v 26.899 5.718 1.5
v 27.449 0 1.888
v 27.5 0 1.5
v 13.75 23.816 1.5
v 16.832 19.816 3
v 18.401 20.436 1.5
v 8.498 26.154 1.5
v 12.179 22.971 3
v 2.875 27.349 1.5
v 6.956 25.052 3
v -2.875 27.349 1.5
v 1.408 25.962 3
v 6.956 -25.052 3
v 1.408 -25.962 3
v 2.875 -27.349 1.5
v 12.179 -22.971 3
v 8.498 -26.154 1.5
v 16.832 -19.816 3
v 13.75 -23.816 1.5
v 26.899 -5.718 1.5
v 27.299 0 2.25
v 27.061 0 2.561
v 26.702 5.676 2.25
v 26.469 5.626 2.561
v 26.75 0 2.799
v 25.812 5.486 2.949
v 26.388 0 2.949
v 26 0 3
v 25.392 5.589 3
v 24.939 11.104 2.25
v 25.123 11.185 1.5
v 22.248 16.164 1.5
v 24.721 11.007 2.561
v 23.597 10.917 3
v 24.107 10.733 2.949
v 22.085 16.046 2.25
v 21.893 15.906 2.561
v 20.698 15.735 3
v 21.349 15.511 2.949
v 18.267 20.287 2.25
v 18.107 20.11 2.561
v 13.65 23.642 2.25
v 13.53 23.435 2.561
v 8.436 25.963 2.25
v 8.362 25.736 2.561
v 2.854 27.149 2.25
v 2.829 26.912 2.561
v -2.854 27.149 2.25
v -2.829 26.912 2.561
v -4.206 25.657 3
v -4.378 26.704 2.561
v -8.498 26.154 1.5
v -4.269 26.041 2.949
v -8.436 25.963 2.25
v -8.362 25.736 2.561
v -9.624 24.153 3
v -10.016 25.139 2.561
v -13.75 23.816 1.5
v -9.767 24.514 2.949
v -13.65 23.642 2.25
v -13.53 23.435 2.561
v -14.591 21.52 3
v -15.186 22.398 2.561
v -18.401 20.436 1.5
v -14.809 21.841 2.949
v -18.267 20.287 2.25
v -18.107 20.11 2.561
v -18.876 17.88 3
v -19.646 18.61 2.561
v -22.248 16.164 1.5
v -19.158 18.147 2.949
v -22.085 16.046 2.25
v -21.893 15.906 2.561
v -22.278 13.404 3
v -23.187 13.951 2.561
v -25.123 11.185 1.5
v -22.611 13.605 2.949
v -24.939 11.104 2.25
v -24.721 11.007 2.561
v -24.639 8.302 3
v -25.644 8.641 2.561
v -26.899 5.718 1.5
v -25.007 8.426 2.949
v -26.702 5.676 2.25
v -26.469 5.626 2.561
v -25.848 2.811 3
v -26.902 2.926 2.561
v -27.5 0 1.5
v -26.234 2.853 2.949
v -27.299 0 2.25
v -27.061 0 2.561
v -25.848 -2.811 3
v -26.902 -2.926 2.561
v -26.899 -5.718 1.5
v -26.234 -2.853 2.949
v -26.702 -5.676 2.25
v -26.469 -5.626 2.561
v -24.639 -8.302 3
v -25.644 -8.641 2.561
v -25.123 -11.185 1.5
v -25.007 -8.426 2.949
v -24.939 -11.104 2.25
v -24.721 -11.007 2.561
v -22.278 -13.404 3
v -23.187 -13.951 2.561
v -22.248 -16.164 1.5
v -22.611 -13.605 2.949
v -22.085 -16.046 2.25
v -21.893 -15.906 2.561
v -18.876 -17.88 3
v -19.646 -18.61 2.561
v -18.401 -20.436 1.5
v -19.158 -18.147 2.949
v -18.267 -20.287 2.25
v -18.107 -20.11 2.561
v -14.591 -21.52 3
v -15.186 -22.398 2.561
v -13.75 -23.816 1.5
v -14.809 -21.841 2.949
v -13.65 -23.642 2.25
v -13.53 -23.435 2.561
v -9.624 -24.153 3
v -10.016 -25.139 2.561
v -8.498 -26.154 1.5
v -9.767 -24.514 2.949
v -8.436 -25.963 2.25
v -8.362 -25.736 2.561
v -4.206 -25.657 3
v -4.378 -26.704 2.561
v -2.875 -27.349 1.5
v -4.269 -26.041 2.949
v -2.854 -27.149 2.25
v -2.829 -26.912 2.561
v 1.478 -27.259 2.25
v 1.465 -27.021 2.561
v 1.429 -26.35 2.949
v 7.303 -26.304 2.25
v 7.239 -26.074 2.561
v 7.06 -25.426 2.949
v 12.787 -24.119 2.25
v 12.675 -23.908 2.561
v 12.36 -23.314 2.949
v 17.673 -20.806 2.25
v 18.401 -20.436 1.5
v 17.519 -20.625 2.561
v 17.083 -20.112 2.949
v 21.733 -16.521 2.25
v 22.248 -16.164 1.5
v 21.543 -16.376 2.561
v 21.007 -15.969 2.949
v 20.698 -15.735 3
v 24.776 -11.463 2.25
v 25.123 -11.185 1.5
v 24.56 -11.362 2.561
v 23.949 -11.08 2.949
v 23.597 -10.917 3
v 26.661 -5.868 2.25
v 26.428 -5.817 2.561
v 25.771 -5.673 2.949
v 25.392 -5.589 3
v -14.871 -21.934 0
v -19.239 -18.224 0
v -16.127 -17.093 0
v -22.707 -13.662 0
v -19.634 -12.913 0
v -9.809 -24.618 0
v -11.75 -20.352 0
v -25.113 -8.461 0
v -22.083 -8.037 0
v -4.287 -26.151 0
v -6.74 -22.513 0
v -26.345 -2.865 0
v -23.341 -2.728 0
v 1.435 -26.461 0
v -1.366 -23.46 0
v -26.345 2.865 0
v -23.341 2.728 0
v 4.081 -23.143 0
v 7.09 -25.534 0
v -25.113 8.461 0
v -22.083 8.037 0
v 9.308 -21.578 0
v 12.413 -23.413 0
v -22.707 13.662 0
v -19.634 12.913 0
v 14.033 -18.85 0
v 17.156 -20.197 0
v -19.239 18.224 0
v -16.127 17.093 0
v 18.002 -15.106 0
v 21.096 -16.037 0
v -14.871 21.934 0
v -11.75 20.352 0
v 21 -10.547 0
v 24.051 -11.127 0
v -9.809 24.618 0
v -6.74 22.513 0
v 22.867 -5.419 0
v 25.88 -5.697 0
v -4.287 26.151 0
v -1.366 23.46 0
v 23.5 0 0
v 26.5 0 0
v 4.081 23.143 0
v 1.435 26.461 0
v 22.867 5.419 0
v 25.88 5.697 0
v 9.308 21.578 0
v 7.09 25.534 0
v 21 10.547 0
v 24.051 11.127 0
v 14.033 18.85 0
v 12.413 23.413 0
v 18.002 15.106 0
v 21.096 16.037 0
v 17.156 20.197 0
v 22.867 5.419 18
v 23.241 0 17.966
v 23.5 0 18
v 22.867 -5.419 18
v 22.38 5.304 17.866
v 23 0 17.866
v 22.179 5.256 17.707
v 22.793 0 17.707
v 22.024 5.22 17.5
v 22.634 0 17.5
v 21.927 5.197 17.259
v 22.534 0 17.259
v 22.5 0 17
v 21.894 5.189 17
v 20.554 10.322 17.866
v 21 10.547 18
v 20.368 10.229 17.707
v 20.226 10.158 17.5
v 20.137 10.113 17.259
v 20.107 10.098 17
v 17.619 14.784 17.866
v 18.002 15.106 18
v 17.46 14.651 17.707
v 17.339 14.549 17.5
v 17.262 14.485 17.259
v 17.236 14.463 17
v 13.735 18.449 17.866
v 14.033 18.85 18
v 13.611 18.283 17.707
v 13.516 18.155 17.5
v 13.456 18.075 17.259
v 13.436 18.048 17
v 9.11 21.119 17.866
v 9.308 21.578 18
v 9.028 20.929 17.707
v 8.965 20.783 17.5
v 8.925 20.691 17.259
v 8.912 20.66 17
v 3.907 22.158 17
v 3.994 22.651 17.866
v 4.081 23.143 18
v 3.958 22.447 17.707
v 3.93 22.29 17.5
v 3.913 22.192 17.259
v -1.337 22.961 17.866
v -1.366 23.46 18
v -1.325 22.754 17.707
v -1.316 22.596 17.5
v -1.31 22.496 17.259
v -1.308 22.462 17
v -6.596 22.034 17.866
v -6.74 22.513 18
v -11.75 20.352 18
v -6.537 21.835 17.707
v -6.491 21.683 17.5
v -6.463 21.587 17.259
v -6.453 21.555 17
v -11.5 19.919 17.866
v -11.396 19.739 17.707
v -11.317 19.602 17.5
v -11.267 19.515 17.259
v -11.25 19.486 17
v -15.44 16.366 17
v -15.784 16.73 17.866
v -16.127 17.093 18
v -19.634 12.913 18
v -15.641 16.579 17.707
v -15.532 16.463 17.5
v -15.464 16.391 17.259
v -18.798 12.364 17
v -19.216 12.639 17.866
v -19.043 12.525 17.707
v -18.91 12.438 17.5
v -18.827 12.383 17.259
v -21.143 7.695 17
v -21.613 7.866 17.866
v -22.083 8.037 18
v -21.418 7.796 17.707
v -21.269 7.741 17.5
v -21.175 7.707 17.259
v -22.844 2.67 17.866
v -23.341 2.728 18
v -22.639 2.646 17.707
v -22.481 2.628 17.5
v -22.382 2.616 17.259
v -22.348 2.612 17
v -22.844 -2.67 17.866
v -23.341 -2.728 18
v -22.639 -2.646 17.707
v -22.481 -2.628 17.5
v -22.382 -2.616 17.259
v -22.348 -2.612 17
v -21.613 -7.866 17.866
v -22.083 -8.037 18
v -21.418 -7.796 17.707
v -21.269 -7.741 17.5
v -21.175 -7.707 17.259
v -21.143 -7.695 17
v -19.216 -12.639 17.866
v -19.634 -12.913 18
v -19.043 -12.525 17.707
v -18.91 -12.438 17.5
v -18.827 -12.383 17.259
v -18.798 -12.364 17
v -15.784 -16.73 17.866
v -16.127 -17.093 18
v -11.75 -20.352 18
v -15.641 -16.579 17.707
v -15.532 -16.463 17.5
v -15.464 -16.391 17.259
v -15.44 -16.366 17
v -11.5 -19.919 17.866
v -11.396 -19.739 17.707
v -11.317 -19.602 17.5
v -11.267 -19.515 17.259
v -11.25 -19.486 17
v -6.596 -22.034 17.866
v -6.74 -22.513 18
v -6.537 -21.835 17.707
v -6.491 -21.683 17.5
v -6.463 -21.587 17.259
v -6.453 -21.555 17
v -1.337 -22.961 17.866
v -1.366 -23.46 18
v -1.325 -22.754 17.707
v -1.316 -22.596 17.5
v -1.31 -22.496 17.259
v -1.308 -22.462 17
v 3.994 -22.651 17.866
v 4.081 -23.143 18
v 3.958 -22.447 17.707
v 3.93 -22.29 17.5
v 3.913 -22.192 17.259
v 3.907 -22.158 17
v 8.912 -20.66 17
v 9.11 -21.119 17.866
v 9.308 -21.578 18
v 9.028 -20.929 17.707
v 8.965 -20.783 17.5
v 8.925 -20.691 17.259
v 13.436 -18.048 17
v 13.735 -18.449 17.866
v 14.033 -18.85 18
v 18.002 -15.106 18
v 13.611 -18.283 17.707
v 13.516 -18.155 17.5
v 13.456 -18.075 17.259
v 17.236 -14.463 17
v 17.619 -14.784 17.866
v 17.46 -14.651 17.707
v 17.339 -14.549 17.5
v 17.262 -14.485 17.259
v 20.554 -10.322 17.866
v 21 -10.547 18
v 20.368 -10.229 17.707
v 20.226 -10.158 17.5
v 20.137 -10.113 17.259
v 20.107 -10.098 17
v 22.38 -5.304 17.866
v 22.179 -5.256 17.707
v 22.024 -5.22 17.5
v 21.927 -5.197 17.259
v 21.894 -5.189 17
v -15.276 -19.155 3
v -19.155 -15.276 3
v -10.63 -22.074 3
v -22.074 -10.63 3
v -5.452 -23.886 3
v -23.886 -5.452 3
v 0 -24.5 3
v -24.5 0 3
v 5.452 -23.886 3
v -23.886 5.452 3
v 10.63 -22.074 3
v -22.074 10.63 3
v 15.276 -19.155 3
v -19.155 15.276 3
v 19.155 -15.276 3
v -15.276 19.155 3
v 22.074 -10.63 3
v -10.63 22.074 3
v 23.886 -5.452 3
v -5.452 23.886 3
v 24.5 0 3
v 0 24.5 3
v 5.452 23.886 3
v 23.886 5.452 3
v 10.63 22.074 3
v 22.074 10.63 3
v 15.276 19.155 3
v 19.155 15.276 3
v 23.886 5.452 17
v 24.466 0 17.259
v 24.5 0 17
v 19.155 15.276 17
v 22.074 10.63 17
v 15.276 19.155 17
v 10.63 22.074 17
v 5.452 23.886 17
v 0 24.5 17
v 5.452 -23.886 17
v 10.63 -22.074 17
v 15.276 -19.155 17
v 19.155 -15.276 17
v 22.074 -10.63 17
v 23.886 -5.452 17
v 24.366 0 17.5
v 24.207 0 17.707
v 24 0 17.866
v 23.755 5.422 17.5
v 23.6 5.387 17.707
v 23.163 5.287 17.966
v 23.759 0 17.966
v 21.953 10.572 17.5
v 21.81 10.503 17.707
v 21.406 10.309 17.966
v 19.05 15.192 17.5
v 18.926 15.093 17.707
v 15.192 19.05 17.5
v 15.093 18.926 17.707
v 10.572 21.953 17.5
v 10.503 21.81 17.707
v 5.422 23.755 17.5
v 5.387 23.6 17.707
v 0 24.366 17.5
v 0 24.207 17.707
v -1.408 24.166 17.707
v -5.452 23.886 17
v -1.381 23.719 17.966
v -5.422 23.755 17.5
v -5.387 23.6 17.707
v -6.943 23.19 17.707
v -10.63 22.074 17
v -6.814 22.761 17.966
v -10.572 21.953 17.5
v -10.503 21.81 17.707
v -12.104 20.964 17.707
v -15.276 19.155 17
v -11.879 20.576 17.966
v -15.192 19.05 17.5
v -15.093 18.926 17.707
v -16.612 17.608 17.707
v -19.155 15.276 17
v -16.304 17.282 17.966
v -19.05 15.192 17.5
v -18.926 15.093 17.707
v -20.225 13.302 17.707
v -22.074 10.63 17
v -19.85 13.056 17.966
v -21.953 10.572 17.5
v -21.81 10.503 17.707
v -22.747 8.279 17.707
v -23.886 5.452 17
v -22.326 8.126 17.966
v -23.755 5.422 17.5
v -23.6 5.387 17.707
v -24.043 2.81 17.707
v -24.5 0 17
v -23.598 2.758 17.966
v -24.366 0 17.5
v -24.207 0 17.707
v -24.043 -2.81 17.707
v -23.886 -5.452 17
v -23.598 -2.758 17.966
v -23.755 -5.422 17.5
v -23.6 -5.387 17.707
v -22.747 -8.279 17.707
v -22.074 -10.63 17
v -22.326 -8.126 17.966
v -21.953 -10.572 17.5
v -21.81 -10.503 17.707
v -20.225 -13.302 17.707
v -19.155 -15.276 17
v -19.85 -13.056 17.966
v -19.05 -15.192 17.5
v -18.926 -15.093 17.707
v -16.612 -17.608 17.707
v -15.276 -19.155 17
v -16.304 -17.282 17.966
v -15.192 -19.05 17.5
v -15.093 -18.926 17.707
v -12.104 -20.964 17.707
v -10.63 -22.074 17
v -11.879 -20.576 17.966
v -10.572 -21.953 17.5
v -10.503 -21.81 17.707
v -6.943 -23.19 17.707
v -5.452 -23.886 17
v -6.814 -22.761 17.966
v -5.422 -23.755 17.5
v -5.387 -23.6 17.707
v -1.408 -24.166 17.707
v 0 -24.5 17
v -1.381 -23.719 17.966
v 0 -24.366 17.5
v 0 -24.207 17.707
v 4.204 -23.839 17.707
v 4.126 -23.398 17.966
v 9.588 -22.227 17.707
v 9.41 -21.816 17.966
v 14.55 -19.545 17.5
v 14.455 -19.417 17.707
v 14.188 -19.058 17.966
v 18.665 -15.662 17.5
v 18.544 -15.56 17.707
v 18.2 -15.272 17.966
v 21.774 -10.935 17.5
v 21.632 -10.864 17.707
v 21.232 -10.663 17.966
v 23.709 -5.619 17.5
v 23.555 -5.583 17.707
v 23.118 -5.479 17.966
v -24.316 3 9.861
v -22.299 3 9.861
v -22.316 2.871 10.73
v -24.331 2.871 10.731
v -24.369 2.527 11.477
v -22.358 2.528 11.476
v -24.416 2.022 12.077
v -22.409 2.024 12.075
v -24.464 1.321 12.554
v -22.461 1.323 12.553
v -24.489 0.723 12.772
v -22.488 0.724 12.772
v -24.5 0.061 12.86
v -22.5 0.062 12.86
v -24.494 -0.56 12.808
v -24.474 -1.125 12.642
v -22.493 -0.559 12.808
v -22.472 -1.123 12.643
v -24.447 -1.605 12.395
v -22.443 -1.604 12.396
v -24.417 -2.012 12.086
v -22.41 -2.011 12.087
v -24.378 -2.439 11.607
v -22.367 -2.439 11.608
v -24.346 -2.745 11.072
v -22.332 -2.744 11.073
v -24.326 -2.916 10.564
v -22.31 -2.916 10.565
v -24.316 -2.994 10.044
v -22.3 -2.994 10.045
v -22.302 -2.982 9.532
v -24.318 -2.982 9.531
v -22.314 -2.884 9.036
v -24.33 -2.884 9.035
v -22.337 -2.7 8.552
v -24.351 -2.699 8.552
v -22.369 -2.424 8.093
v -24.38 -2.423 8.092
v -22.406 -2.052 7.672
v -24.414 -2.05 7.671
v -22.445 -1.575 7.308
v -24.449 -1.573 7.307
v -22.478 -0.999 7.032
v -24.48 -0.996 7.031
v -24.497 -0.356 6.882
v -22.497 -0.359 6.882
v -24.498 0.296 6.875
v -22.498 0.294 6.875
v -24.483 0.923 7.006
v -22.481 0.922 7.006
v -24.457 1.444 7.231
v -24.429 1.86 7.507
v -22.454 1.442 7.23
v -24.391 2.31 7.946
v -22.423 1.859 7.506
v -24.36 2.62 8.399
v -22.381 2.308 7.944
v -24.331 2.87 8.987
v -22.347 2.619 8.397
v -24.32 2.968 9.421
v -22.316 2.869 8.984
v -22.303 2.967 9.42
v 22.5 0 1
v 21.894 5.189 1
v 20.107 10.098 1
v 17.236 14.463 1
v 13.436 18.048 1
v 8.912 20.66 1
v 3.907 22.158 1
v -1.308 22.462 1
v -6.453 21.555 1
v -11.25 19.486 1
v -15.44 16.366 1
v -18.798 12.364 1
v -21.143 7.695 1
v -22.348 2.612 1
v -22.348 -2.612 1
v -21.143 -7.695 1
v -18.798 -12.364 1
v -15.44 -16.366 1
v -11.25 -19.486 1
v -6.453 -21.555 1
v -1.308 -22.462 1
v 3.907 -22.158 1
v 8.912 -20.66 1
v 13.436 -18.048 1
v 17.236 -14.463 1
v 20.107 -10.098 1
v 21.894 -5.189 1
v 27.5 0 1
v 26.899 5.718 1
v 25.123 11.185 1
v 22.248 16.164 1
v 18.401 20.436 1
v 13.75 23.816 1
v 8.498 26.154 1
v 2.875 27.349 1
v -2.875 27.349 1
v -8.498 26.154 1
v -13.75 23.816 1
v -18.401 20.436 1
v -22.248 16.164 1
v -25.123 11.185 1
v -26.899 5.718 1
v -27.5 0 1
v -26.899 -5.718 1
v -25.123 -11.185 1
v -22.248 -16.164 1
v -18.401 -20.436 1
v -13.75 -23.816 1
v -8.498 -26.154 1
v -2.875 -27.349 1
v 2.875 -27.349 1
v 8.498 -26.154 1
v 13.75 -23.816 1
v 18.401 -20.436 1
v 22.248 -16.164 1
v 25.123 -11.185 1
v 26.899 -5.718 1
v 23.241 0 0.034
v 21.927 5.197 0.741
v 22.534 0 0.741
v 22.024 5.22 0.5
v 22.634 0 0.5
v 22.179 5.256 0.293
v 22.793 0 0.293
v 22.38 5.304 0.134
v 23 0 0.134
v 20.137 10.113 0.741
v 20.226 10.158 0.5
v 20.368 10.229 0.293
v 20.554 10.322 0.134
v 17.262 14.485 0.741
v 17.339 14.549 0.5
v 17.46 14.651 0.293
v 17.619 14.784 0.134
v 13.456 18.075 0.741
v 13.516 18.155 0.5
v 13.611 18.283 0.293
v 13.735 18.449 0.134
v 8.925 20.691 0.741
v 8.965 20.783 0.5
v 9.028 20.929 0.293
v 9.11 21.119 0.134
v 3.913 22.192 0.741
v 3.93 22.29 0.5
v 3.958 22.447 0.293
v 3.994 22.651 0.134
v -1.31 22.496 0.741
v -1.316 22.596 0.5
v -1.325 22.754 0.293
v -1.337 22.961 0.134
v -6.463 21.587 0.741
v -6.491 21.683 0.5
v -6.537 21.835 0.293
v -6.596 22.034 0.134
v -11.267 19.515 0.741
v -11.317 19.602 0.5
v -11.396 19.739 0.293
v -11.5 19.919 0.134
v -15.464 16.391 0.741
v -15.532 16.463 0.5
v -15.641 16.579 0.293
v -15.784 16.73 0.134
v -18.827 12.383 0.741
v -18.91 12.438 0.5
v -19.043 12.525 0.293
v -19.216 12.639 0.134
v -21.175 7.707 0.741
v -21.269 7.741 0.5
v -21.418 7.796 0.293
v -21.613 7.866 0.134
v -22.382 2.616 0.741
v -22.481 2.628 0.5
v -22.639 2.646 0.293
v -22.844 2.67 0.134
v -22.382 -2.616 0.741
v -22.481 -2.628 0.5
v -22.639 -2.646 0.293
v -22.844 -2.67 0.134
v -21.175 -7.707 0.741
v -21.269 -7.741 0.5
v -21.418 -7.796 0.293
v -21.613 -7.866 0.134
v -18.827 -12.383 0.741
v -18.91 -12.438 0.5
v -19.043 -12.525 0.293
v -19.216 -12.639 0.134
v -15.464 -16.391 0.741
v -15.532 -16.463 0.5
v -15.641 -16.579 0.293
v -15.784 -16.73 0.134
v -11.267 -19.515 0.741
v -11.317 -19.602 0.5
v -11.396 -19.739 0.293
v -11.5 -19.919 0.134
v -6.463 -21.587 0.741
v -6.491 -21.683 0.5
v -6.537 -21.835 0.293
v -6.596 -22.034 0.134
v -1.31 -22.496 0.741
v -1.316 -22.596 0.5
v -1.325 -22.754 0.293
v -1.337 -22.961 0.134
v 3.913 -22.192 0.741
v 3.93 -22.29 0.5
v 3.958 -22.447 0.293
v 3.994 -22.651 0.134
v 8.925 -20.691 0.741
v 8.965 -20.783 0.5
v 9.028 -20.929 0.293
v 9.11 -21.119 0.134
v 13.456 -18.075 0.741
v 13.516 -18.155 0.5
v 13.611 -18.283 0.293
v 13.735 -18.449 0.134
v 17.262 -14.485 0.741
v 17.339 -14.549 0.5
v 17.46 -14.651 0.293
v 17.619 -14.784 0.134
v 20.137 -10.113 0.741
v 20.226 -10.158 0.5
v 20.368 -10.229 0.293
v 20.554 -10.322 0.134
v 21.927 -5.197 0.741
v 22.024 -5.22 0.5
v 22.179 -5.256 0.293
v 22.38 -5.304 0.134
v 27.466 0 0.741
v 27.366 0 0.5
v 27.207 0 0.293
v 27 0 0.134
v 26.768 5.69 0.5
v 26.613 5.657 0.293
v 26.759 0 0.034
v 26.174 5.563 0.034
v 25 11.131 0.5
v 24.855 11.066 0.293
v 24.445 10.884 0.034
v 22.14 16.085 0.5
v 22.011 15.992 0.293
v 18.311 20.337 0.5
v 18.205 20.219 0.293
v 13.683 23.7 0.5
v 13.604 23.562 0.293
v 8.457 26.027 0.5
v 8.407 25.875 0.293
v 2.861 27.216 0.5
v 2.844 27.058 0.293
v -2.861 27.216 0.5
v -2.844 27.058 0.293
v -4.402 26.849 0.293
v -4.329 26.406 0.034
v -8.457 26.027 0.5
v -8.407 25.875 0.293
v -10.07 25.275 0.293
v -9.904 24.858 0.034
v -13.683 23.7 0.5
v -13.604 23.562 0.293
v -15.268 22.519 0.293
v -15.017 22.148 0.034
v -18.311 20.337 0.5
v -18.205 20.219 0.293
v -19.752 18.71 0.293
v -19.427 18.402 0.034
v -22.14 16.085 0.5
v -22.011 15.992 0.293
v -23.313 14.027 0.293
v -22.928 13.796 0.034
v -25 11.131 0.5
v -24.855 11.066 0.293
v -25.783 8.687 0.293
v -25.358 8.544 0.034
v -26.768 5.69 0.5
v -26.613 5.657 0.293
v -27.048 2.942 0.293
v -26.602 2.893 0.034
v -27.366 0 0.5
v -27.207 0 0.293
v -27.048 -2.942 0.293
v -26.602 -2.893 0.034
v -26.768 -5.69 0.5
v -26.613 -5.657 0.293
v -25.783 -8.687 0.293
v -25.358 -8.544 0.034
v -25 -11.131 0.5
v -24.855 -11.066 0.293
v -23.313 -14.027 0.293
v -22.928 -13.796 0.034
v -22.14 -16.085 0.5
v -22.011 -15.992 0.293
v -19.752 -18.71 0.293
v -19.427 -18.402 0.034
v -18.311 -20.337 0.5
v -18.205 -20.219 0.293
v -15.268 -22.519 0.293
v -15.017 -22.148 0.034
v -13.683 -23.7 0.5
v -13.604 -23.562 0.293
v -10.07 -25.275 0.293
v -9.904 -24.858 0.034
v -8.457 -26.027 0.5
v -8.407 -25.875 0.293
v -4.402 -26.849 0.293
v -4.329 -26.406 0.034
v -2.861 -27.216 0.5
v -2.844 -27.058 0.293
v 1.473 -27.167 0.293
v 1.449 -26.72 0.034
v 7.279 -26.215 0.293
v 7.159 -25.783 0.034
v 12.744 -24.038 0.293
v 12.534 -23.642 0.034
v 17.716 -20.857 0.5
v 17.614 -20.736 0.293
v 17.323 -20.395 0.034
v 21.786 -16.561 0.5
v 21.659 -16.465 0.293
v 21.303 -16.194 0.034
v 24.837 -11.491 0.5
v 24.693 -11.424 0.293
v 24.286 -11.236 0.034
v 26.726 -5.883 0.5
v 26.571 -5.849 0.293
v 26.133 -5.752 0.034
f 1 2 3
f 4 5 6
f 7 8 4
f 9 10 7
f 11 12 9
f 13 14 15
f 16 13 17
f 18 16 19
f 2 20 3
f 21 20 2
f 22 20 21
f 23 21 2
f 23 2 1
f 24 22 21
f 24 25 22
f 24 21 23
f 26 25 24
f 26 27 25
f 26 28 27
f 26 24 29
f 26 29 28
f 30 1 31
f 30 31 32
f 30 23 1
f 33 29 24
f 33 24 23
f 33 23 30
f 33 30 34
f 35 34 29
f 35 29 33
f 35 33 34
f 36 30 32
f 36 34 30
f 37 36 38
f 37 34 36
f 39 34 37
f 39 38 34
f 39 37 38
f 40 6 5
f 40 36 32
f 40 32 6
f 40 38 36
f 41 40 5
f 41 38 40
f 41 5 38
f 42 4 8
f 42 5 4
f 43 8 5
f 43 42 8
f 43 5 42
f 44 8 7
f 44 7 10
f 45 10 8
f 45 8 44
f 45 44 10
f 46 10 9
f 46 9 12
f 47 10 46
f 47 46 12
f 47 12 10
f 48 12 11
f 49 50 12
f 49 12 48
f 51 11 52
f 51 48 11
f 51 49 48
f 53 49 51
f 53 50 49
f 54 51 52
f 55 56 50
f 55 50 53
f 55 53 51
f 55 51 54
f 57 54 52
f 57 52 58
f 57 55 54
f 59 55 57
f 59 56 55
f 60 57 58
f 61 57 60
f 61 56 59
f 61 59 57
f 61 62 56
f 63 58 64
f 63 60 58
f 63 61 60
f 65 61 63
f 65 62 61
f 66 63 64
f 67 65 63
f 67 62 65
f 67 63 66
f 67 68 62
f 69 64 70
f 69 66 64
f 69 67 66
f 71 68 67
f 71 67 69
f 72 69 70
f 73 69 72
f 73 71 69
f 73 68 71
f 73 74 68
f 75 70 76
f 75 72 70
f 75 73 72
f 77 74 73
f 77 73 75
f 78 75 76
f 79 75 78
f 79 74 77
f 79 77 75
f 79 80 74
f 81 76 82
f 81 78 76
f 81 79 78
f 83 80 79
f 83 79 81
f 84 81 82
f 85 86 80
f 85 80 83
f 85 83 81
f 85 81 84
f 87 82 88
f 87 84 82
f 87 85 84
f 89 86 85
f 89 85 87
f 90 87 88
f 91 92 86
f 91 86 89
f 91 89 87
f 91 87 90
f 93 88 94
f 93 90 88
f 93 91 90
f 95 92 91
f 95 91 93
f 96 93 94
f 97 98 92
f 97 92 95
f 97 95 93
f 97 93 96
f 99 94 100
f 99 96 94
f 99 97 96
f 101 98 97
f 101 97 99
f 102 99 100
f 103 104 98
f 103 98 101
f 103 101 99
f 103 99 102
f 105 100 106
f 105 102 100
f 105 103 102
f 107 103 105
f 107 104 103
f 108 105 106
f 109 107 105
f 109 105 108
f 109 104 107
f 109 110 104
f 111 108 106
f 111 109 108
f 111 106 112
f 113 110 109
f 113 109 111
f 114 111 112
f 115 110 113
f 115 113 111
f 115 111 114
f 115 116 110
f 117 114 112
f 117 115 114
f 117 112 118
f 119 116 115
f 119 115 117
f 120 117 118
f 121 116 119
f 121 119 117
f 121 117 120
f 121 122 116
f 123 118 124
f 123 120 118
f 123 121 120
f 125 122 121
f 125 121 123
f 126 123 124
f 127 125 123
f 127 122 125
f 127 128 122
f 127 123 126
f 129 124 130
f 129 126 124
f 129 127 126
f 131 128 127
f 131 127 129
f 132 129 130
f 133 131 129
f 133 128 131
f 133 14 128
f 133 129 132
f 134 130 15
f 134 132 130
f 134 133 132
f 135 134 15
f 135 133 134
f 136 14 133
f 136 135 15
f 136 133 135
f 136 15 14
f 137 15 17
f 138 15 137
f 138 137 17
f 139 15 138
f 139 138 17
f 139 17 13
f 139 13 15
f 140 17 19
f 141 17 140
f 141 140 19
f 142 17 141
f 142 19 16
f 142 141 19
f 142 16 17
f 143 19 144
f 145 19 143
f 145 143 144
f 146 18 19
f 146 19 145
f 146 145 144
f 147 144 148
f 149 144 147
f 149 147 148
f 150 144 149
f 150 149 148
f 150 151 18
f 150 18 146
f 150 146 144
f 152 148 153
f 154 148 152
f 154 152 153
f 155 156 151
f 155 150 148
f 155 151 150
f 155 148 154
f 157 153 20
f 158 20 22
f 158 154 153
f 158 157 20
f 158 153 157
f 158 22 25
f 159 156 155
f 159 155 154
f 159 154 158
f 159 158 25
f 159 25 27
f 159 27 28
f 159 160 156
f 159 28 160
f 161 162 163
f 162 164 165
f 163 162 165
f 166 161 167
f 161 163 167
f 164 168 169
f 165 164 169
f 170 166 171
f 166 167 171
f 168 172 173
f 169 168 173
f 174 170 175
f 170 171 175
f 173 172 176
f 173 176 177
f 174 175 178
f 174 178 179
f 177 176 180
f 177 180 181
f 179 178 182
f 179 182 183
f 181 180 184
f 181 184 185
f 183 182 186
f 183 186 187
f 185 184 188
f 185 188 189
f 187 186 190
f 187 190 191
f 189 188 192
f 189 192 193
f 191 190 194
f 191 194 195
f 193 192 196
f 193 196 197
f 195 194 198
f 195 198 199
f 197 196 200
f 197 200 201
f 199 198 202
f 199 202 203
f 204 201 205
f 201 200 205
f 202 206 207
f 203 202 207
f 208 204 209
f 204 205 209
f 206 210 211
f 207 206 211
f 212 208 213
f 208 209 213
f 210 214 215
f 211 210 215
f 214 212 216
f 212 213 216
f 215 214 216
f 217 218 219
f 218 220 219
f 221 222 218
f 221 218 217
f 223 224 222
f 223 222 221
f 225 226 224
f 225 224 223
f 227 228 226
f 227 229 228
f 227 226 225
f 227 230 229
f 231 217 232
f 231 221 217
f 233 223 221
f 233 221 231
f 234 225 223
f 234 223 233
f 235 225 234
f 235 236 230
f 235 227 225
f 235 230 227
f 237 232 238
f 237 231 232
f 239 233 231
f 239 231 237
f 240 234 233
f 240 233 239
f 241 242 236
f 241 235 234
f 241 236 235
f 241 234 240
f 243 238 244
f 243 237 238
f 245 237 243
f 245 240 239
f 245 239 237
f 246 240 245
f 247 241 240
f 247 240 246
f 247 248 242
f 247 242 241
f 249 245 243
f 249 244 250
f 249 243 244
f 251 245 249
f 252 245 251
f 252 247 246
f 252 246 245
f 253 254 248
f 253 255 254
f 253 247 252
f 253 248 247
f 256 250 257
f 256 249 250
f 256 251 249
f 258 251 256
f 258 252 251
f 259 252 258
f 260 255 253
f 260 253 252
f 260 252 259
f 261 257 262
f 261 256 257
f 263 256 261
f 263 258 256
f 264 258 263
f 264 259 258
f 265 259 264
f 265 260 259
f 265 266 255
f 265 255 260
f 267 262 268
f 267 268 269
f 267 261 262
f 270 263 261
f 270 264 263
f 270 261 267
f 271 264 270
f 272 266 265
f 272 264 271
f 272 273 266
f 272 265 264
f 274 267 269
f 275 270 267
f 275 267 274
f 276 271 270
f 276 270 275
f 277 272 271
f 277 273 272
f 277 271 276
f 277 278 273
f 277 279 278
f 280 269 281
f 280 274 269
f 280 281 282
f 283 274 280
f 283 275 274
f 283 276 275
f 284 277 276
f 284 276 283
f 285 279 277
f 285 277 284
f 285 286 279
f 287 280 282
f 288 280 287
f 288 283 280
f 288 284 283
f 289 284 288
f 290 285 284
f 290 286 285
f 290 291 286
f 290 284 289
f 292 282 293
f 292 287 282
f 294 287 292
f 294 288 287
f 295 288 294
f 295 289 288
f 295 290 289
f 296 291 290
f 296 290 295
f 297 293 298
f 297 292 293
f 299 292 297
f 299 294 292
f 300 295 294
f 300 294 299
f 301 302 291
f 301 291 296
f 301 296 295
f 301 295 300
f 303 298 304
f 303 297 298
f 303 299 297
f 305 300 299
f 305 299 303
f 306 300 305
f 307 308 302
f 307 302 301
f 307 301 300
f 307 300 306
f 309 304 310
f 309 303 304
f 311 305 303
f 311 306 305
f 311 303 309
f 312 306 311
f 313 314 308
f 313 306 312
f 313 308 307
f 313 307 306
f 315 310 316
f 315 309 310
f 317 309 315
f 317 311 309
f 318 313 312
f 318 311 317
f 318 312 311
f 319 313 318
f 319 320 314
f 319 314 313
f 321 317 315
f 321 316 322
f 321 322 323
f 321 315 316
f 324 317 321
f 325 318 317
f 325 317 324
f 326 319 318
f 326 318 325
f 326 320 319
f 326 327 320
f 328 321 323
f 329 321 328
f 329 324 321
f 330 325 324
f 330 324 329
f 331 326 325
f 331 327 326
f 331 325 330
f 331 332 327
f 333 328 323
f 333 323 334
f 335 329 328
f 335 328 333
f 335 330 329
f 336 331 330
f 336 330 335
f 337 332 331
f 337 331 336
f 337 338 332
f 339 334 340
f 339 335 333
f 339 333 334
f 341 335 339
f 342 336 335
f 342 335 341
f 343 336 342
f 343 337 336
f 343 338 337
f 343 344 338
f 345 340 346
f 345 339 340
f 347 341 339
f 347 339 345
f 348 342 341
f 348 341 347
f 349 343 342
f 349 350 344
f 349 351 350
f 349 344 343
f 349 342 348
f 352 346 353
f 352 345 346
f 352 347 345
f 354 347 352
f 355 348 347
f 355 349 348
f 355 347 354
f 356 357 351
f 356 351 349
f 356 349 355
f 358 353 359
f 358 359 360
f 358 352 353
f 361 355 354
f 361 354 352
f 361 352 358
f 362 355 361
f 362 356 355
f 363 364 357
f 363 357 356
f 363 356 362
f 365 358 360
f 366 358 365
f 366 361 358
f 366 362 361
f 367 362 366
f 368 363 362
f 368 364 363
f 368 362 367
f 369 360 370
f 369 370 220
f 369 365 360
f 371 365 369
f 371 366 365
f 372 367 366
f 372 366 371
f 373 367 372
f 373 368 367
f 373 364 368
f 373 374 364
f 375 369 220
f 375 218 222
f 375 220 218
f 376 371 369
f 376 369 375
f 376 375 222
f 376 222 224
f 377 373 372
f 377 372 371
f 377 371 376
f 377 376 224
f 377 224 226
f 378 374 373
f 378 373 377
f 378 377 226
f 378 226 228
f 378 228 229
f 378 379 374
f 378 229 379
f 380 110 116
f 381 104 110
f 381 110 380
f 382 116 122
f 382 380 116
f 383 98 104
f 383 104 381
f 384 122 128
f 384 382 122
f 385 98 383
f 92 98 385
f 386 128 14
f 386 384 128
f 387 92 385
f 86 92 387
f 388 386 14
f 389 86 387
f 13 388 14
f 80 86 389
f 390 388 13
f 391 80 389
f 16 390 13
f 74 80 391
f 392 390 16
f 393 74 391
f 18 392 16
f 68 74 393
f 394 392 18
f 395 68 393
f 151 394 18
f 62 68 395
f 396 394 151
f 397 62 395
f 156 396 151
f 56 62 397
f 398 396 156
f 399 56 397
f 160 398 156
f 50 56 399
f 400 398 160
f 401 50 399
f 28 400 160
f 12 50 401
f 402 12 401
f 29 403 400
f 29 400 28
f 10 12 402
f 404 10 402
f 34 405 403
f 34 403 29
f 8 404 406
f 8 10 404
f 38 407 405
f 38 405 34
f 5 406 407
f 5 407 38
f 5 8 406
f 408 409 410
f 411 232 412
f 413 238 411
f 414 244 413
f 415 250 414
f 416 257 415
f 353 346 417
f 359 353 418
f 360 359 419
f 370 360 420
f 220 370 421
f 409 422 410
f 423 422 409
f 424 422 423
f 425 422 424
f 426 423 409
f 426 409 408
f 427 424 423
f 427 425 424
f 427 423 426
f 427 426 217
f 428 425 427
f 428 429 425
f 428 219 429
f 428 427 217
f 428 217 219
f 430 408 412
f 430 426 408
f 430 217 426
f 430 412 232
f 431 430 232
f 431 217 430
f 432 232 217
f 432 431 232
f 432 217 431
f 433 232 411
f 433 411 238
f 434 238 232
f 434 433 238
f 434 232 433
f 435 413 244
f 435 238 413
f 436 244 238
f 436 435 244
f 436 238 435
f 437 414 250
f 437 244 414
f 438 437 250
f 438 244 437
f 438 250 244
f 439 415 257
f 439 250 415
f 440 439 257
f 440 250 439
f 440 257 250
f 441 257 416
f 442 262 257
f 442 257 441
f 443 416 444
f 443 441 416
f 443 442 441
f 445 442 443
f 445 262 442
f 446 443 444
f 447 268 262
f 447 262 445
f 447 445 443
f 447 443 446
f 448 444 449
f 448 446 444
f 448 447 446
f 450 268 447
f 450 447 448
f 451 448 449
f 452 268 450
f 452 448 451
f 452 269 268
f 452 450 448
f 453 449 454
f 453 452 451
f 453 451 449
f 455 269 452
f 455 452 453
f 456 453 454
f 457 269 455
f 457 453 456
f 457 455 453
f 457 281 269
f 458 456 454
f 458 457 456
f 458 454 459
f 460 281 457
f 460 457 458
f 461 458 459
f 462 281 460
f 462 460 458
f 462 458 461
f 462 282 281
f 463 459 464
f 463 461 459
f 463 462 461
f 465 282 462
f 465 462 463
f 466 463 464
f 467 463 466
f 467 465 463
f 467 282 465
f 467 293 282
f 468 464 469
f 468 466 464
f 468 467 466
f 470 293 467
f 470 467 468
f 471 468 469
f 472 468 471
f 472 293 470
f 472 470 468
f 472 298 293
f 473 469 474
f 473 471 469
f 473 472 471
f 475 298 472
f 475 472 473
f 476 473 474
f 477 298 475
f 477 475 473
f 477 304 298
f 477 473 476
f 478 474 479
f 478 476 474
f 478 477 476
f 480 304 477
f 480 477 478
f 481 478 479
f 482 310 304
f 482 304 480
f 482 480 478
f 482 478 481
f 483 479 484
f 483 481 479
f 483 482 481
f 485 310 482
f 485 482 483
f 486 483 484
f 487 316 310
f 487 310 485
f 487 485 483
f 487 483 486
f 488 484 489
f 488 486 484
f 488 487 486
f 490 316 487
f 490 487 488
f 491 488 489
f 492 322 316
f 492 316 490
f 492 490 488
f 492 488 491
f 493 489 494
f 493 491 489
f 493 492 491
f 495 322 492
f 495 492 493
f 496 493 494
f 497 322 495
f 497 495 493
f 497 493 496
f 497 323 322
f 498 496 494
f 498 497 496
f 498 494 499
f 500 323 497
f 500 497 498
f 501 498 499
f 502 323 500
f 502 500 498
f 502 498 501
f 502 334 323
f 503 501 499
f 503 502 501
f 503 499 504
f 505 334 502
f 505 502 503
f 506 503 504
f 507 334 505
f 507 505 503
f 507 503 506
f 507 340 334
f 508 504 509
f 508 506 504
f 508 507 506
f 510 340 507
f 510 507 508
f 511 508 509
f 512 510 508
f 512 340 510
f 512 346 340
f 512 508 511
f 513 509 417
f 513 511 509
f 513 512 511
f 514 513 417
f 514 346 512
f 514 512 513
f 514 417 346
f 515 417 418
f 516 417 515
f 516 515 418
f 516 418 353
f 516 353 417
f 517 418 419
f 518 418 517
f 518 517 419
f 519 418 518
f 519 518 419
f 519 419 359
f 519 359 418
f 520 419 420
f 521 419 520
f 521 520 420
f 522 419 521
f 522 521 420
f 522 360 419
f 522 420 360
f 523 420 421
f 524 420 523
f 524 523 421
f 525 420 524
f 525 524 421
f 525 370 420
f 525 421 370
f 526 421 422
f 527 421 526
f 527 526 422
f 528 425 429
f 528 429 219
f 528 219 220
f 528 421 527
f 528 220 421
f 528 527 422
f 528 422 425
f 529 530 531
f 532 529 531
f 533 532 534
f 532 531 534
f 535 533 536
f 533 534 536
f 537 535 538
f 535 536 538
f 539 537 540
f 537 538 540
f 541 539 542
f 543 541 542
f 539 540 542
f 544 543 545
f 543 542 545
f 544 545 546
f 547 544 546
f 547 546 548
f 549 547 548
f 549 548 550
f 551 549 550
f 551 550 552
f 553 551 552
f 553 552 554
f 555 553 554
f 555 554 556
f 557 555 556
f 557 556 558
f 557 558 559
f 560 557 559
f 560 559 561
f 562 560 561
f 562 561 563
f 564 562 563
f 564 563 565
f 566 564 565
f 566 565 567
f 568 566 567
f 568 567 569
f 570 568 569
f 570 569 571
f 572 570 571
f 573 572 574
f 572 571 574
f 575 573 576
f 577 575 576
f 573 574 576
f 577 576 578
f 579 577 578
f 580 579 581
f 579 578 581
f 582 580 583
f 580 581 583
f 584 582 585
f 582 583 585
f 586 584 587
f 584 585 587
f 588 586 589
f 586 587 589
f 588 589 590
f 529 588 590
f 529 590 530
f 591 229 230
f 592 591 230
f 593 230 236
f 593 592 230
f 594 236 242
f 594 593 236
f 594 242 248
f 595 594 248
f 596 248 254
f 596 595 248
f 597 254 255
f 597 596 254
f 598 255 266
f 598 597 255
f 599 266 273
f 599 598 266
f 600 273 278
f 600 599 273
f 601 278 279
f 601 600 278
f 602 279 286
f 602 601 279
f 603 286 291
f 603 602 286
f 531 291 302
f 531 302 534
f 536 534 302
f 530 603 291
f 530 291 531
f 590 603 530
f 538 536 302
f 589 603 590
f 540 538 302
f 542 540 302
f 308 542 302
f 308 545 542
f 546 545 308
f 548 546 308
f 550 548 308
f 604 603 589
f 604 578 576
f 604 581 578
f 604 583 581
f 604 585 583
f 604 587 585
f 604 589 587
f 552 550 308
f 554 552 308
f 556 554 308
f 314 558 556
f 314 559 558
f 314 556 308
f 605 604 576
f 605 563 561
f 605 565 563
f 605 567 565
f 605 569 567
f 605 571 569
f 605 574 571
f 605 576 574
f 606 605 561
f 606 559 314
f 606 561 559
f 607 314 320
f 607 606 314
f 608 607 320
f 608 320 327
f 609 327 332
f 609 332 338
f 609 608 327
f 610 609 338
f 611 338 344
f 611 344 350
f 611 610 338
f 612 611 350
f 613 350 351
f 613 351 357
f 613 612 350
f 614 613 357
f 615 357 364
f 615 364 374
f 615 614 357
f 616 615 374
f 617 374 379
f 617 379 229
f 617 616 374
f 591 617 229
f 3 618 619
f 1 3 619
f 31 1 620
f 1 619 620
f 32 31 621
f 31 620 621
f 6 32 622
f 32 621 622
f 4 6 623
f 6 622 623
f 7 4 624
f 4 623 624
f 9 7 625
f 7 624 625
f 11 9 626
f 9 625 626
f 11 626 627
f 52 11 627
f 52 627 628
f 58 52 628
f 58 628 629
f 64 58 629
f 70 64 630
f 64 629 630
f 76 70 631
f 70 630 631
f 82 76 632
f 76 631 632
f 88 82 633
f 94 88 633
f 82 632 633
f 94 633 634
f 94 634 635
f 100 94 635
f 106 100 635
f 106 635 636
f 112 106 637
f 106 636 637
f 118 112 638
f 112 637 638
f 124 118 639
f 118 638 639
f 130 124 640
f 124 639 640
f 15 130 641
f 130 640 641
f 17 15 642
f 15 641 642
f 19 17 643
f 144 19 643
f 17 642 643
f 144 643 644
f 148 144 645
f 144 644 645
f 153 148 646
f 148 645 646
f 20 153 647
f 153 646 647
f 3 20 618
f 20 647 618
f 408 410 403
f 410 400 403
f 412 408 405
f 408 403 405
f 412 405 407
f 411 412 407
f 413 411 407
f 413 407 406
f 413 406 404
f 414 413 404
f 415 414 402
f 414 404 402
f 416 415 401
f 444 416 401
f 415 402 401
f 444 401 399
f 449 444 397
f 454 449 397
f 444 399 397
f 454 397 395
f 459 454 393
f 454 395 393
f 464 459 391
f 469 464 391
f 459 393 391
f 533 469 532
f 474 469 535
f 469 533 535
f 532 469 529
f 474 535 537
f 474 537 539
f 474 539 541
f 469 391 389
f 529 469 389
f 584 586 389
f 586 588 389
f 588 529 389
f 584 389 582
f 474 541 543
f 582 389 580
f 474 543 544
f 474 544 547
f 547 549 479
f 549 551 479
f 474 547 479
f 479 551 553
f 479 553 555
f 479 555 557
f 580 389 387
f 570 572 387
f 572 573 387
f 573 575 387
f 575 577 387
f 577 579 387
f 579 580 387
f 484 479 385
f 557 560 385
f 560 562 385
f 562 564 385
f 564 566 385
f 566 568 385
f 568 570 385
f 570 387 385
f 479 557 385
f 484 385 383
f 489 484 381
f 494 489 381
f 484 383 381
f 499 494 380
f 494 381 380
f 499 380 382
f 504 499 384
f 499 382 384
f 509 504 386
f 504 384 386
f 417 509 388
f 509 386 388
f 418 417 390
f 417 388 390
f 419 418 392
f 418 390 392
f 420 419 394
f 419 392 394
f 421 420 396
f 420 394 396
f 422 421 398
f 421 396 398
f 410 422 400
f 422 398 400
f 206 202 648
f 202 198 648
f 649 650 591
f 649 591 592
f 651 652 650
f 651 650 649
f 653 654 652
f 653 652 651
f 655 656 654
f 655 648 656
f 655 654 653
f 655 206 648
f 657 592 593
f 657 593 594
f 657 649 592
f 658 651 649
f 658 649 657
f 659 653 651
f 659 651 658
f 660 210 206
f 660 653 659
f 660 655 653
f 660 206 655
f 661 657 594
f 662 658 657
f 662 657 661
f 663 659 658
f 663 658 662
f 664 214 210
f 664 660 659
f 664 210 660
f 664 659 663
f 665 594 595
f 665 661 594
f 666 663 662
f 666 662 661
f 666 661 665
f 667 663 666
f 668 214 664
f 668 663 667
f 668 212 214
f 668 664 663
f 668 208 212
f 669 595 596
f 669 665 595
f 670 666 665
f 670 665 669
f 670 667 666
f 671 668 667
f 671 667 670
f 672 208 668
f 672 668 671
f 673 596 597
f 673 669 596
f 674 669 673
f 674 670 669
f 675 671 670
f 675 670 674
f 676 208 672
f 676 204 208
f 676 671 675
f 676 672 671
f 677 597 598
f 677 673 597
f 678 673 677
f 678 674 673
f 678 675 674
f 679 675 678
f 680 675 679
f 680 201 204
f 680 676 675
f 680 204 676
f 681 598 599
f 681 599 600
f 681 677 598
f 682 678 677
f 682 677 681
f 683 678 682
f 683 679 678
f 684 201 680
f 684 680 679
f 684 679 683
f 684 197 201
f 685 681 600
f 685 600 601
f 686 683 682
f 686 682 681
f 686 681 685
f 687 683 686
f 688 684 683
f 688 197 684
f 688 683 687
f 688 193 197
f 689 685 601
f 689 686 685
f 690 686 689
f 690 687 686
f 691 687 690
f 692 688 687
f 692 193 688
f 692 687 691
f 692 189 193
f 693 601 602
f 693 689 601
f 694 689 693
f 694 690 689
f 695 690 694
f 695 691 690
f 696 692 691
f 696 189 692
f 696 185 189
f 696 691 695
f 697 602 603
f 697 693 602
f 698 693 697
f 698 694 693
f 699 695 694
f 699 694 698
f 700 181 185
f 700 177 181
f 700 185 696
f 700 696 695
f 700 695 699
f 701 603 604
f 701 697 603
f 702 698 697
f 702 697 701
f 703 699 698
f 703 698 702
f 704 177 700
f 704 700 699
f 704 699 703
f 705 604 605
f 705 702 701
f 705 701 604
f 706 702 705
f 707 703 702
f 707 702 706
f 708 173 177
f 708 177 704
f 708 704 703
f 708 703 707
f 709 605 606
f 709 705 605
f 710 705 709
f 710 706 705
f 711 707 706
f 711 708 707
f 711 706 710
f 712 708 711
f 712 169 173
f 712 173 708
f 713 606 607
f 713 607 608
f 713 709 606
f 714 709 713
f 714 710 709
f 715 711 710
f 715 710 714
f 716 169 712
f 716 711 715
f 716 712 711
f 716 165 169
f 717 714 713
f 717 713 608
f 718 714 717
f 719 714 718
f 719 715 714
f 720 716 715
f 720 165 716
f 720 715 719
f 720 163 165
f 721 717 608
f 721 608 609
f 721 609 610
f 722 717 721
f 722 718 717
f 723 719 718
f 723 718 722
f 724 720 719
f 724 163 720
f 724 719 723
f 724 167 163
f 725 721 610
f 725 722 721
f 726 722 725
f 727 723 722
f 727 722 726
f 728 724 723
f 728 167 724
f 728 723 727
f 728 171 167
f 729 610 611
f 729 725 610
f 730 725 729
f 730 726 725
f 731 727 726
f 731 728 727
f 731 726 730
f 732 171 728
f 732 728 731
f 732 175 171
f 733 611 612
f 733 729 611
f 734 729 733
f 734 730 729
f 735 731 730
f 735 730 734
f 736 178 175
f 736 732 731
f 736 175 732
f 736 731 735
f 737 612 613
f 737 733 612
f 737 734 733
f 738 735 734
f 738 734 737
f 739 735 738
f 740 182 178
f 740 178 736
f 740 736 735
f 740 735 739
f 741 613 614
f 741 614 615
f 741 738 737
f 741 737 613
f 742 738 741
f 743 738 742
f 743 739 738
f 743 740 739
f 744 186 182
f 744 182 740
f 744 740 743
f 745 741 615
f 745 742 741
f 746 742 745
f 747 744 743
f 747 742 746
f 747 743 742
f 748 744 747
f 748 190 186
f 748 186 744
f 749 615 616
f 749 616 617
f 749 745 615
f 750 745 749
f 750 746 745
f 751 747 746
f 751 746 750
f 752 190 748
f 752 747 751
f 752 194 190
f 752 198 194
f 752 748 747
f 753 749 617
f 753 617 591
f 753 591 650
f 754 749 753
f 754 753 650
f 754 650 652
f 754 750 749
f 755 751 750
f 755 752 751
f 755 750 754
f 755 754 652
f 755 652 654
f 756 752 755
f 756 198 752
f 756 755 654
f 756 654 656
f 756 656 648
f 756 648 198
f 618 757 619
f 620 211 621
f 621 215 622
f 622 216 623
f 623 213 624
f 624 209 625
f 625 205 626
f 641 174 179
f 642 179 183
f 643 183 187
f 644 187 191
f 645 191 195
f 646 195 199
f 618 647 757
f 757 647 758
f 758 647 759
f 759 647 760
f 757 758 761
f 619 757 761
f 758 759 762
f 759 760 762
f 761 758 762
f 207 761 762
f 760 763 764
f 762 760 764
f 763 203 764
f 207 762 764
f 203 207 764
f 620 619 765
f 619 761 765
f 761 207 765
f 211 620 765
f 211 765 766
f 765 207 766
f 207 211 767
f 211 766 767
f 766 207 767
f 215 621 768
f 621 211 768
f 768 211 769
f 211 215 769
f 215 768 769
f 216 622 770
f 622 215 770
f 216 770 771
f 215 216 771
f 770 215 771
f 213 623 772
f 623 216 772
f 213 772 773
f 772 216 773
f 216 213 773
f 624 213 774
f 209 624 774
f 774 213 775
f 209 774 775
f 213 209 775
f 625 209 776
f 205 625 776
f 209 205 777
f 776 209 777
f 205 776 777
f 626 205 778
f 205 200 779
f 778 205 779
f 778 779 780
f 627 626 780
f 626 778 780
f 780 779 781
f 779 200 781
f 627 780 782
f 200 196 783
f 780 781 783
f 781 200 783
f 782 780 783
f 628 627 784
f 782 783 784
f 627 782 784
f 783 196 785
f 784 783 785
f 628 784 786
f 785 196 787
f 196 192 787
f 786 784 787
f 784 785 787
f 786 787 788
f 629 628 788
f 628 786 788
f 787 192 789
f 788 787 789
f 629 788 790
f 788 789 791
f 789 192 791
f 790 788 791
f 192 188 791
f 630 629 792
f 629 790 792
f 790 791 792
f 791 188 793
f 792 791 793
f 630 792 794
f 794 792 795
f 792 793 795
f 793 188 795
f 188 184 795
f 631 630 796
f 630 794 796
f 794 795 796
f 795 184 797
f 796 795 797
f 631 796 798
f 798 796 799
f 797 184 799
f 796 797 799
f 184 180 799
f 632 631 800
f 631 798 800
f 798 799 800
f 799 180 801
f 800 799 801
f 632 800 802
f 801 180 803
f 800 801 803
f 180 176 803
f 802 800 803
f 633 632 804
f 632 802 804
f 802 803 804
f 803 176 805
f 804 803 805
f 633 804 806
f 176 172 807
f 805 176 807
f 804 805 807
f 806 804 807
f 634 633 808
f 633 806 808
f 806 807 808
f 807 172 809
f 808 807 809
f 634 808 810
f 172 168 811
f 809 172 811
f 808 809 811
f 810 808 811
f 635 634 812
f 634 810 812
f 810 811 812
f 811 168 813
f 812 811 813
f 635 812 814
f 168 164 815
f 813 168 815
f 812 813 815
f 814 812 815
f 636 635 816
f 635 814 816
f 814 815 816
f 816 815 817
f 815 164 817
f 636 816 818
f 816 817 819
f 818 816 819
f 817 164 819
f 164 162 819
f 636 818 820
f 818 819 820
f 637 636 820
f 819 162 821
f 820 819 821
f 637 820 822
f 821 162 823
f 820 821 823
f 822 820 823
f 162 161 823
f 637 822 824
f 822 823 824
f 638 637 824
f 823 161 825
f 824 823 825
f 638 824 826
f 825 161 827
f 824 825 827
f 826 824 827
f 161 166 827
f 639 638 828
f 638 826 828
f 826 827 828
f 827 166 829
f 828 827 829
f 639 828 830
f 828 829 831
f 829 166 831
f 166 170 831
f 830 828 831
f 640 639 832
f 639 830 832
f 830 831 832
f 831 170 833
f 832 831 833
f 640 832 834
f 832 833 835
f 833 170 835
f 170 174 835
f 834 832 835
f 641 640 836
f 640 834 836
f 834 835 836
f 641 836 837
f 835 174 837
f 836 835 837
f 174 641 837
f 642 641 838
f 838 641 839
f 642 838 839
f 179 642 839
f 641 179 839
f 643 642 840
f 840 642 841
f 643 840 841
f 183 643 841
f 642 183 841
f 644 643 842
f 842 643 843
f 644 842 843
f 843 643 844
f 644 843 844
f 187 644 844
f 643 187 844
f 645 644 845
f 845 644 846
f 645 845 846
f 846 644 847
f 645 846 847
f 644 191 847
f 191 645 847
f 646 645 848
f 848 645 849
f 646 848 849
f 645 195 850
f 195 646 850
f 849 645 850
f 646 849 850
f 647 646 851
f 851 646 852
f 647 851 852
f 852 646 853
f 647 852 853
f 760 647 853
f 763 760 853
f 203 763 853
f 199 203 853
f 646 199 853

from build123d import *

# Parameters (mm, degrees)
F0_R     = 27.5
F0_R_2   = 24.5
F1_DEPTH = 3
F0_R_3   = 22.5
F2_DEPTH = 18
F3_R     = 1
F4_R     = 1.5
F5_R     = 0.99999
F7_D     = 6
F7_DEPTH = 25
F7_TIP   = 1.8025818571


# Not quite as in the source:
# - a fillet or chamfer is up to 0.001 mm smaller than in the source, because OpenCascade refuses the exact size


with BuildPart() as f1:
    # F0 (on Top) → F1 (new body)
    with BuildSketch(Plane.XY):
        Circle(F0_R)
        Circle(F0_R_2, mode=Mode.SUBTRACT)
    extrude(amount=F1_DEPTH)

    # F0 (on Top) → F2 (join)
    with BuildSketch(Plane.XY):
        Circle(F0_R_2)
        Circle(F0_R_3, mode=Mode.SUBTRACT)
    extrude(amount=F2_DEPTH)

    # F3
    f3_edges = [f1.edges().sort_by_distance(p)[0] for p in [
        (-27.5, 0, 0),
        (-22.5, 0, 0),
    ]]
    fillet(f3_edges, radius=F3_R)

    # F4
    f4_edges = [f1.edges().sort_by_distance(p)[0] for p in [
        (-27.5, 0, 3),
    ]]
    fillet(f4_edges, radius=F4_R)

    # F5 (radius 1 in the source; OpenCascade refuses exactly that, so slightly less here)
    f5_edges = [f1.edges().sort_by_distance(p)[0] for p in [
        (-22.5, 0, 18),
        (-24.5, 0, 18),
    ]]
    fillet(f5_edges, radius=F5_R)

    # F7 (one way)
    with BuildSketch(Plane.YZ):
        with Locations((0, 9.8607558757)):
            Circle(F7_D / 2)
    extrude(amount=-F7_DEPTH, mode=Mode.SUBTRACT)
    with Locations(Plane.YZ):
        with Locations((0, 9.8607558757)):
            with Locations((0, 0, -(F7_DEPTH + F7_TIP / 2))):  # 118° drill point
                Cone(0, F7_D / 2, F7_TIP, mode=Mode.SUBTRACT)


solid = f1.part
